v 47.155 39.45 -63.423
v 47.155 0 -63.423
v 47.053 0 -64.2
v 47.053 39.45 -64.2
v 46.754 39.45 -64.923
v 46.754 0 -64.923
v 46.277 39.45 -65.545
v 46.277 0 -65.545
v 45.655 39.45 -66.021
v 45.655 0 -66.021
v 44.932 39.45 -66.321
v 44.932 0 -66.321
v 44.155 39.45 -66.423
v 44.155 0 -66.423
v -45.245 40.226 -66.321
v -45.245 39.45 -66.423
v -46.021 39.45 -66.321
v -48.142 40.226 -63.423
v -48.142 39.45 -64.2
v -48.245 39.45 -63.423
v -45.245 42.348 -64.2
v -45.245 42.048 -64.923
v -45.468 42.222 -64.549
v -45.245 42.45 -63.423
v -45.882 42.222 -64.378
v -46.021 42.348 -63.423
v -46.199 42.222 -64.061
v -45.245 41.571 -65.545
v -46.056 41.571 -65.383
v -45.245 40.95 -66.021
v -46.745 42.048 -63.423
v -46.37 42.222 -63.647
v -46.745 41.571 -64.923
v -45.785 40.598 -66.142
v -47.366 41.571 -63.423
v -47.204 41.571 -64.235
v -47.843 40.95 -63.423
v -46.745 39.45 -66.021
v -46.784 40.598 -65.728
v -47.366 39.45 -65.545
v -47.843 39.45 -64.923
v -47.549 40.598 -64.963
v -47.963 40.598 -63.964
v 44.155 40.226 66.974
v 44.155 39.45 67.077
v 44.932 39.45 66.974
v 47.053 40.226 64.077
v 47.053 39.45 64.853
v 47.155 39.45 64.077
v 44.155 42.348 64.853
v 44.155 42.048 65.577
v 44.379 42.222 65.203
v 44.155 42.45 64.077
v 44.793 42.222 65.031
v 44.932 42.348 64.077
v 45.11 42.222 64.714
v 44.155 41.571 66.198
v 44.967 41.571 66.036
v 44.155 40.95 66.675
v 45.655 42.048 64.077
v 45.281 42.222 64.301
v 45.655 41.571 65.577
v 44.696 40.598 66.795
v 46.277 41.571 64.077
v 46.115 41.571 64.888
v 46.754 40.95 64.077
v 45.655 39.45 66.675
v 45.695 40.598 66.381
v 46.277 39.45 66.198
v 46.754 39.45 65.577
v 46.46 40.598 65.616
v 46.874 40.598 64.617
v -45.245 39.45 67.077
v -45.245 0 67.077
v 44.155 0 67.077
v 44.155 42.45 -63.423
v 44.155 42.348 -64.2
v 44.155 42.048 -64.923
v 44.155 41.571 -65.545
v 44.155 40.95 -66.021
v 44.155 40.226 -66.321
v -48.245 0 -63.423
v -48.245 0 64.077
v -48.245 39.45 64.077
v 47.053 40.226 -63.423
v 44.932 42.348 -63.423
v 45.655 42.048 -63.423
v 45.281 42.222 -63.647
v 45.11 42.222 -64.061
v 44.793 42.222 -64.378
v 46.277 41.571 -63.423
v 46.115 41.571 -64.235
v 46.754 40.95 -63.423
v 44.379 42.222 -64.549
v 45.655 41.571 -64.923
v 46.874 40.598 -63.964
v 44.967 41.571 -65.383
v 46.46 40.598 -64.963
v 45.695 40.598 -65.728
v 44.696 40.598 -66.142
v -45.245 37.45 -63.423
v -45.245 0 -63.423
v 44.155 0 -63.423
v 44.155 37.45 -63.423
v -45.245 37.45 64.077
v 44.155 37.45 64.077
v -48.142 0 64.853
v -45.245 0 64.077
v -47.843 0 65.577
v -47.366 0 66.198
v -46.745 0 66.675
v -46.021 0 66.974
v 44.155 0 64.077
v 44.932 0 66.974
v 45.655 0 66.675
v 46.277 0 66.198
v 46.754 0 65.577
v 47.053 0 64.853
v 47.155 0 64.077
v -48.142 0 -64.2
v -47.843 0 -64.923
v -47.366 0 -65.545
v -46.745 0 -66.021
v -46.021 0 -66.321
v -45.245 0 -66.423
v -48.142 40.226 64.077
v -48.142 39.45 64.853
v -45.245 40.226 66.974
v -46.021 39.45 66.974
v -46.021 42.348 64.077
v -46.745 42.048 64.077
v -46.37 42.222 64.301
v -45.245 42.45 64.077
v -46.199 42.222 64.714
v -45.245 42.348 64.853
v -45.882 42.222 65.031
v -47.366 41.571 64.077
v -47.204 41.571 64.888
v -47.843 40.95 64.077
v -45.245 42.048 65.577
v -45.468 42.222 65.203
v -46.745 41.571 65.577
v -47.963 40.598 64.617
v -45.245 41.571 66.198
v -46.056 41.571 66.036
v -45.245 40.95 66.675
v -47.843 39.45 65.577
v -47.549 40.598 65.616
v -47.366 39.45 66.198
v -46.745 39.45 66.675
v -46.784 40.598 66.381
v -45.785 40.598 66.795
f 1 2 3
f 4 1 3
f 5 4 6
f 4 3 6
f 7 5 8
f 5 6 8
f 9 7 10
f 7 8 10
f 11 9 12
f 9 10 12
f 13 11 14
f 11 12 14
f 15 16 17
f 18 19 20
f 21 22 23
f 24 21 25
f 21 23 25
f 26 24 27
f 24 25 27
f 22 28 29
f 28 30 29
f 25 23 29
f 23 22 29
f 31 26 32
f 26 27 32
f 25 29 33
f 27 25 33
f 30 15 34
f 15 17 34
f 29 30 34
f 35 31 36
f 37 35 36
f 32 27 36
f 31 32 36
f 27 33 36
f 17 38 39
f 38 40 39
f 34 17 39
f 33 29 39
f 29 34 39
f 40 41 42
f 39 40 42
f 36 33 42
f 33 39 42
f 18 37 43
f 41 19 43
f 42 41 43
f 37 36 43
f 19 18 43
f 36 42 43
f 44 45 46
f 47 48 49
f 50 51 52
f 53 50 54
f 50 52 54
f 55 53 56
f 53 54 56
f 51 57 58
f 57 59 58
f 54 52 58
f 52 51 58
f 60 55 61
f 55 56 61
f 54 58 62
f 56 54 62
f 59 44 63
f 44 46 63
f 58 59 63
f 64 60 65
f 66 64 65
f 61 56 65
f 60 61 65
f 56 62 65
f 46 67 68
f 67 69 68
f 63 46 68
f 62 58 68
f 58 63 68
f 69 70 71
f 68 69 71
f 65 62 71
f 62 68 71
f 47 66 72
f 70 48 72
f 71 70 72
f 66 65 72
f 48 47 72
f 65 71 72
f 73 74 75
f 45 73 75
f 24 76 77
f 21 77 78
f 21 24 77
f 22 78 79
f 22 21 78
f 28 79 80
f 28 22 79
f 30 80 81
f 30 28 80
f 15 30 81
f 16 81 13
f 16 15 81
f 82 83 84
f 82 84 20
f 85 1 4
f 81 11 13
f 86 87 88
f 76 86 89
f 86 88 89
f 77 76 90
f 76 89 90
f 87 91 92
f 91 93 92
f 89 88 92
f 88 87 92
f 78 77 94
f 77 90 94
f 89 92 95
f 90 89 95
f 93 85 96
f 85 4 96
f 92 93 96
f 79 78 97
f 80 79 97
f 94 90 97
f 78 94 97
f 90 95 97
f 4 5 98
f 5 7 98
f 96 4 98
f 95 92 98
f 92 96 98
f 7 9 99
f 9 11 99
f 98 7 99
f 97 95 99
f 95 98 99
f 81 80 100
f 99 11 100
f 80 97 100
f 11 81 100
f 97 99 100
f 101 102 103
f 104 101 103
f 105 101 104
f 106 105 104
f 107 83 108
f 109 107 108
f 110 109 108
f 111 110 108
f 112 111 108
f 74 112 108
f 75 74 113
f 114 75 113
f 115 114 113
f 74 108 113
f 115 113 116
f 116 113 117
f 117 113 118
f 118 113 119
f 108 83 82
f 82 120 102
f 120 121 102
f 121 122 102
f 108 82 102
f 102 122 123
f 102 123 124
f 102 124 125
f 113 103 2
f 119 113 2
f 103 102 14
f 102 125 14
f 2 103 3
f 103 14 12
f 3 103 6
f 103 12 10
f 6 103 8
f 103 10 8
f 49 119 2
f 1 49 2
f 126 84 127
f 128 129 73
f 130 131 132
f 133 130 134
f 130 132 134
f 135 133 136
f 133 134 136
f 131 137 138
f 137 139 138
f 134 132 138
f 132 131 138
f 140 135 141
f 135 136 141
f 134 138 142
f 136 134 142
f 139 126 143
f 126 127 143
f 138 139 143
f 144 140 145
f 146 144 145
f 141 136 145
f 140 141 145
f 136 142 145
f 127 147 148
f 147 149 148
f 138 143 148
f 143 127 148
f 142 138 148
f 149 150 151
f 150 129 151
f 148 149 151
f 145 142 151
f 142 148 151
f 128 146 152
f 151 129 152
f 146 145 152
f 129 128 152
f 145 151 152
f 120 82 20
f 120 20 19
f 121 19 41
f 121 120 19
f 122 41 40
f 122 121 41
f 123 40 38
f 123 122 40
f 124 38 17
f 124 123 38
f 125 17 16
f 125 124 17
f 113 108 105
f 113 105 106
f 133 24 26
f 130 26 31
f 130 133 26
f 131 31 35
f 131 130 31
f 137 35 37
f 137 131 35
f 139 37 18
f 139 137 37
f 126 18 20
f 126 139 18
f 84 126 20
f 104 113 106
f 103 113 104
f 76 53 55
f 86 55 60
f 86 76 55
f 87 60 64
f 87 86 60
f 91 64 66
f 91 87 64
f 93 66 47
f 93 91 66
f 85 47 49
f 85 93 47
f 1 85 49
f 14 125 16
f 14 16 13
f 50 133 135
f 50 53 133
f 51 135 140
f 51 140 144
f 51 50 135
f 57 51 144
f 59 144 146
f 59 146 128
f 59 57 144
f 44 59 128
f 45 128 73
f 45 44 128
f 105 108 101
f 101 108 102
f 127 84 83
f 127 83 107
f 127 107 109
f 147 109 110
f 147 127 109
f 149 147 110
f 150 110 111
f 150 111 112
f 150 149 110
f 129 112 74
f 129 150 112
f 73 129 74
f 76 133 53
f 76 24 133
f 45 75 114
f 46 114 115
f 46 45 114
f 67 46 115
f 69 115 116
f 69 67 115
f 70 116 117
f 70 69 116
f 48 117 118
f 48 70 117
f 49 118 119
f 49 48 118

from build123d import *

# Parameters (mm, degrees)
SKETCH1_W           = 95.4
SKETCH1_H           = 133.5
SKETCH1_W_2         = 89.4
SKETCH1_H_2         = 127.5
EXTRUDE_THIN1_DEPTH = 37.45
SKETCH2_W           = 95.4
SKETCH2_H           = 133.5
BOSS_EXTRUDE1_DEPTH = 5
FILLET3_R           = 3
FILLET4_R           = 3


with BuildPart() as part:
    # Sketch1 → Extrude-Thin1 (new body)
    with BuildSketch(Plane(origin=(0, 0, 0), x_dir=(1, 0, 0), z_dir=(0, 1, 0))):
        with Locations((-0.544500843, -0.326636011)):
            Rectangle(SKETCH1_W, SKETCH1_H)
        with Locations((-0.544500843, -0.326636011)):
            Rectangle(SKETCH1_W_2, SKETCH1_H_2, mode=Mode.SUBTRACT)
    extrude(amount=EXTRUDE_THIN1_DEPTH)

    # Sketch2 → Boss-Extrude1 (add)
    with BuildSketch(Plane(origin=(0, 37.45, 0), x_dir=(1, 0, 0), z_dir=(0, 1, 0))):
        with Locations((-0.544500843, -0.326636011)):
            Rectangle(SKETCH2_W, SKETCH2_H)
    extrude(amount=BOSS_EXTRUDE1_DEPTH)

    # Fillet3
    fillet3_edges = [part.edges().sort_by_distance(p)[0] for p in [
        (47.155499157, 21.225, 67.076636011),
        (-48.244500843, 21.225, 67.076636011),
        (-48.244500843, 21.225, -66.423363989),
        (47.155499157, 21.225, -66.423363989),
    ]]
    fillet(fillet3_edges, radius=FILLET3_R)

    # Fillet4
    fillet4_edges = [part.edges().sort_by_distance(p)[0] for p in [
        (-0.544500843, 42.45, 67.076636011),
        (-48.244500843, 42.45, 0.326636011),
        (47.155499157, 42.45, 0.326636011),
        (-0.544500843, 42.45, -66.423363989),
        (-47.365821187, 42.45, -65.544684332),
        (46.2768195, 42.45, -65.544684332),
        (46.2768195, 42.45, 66.197956355),
        (-47.365821187, 42.45, 66.197956355),
    ]]
    fillet(fillet4_edges, radius=FILLET4_R)


solid = part.part
